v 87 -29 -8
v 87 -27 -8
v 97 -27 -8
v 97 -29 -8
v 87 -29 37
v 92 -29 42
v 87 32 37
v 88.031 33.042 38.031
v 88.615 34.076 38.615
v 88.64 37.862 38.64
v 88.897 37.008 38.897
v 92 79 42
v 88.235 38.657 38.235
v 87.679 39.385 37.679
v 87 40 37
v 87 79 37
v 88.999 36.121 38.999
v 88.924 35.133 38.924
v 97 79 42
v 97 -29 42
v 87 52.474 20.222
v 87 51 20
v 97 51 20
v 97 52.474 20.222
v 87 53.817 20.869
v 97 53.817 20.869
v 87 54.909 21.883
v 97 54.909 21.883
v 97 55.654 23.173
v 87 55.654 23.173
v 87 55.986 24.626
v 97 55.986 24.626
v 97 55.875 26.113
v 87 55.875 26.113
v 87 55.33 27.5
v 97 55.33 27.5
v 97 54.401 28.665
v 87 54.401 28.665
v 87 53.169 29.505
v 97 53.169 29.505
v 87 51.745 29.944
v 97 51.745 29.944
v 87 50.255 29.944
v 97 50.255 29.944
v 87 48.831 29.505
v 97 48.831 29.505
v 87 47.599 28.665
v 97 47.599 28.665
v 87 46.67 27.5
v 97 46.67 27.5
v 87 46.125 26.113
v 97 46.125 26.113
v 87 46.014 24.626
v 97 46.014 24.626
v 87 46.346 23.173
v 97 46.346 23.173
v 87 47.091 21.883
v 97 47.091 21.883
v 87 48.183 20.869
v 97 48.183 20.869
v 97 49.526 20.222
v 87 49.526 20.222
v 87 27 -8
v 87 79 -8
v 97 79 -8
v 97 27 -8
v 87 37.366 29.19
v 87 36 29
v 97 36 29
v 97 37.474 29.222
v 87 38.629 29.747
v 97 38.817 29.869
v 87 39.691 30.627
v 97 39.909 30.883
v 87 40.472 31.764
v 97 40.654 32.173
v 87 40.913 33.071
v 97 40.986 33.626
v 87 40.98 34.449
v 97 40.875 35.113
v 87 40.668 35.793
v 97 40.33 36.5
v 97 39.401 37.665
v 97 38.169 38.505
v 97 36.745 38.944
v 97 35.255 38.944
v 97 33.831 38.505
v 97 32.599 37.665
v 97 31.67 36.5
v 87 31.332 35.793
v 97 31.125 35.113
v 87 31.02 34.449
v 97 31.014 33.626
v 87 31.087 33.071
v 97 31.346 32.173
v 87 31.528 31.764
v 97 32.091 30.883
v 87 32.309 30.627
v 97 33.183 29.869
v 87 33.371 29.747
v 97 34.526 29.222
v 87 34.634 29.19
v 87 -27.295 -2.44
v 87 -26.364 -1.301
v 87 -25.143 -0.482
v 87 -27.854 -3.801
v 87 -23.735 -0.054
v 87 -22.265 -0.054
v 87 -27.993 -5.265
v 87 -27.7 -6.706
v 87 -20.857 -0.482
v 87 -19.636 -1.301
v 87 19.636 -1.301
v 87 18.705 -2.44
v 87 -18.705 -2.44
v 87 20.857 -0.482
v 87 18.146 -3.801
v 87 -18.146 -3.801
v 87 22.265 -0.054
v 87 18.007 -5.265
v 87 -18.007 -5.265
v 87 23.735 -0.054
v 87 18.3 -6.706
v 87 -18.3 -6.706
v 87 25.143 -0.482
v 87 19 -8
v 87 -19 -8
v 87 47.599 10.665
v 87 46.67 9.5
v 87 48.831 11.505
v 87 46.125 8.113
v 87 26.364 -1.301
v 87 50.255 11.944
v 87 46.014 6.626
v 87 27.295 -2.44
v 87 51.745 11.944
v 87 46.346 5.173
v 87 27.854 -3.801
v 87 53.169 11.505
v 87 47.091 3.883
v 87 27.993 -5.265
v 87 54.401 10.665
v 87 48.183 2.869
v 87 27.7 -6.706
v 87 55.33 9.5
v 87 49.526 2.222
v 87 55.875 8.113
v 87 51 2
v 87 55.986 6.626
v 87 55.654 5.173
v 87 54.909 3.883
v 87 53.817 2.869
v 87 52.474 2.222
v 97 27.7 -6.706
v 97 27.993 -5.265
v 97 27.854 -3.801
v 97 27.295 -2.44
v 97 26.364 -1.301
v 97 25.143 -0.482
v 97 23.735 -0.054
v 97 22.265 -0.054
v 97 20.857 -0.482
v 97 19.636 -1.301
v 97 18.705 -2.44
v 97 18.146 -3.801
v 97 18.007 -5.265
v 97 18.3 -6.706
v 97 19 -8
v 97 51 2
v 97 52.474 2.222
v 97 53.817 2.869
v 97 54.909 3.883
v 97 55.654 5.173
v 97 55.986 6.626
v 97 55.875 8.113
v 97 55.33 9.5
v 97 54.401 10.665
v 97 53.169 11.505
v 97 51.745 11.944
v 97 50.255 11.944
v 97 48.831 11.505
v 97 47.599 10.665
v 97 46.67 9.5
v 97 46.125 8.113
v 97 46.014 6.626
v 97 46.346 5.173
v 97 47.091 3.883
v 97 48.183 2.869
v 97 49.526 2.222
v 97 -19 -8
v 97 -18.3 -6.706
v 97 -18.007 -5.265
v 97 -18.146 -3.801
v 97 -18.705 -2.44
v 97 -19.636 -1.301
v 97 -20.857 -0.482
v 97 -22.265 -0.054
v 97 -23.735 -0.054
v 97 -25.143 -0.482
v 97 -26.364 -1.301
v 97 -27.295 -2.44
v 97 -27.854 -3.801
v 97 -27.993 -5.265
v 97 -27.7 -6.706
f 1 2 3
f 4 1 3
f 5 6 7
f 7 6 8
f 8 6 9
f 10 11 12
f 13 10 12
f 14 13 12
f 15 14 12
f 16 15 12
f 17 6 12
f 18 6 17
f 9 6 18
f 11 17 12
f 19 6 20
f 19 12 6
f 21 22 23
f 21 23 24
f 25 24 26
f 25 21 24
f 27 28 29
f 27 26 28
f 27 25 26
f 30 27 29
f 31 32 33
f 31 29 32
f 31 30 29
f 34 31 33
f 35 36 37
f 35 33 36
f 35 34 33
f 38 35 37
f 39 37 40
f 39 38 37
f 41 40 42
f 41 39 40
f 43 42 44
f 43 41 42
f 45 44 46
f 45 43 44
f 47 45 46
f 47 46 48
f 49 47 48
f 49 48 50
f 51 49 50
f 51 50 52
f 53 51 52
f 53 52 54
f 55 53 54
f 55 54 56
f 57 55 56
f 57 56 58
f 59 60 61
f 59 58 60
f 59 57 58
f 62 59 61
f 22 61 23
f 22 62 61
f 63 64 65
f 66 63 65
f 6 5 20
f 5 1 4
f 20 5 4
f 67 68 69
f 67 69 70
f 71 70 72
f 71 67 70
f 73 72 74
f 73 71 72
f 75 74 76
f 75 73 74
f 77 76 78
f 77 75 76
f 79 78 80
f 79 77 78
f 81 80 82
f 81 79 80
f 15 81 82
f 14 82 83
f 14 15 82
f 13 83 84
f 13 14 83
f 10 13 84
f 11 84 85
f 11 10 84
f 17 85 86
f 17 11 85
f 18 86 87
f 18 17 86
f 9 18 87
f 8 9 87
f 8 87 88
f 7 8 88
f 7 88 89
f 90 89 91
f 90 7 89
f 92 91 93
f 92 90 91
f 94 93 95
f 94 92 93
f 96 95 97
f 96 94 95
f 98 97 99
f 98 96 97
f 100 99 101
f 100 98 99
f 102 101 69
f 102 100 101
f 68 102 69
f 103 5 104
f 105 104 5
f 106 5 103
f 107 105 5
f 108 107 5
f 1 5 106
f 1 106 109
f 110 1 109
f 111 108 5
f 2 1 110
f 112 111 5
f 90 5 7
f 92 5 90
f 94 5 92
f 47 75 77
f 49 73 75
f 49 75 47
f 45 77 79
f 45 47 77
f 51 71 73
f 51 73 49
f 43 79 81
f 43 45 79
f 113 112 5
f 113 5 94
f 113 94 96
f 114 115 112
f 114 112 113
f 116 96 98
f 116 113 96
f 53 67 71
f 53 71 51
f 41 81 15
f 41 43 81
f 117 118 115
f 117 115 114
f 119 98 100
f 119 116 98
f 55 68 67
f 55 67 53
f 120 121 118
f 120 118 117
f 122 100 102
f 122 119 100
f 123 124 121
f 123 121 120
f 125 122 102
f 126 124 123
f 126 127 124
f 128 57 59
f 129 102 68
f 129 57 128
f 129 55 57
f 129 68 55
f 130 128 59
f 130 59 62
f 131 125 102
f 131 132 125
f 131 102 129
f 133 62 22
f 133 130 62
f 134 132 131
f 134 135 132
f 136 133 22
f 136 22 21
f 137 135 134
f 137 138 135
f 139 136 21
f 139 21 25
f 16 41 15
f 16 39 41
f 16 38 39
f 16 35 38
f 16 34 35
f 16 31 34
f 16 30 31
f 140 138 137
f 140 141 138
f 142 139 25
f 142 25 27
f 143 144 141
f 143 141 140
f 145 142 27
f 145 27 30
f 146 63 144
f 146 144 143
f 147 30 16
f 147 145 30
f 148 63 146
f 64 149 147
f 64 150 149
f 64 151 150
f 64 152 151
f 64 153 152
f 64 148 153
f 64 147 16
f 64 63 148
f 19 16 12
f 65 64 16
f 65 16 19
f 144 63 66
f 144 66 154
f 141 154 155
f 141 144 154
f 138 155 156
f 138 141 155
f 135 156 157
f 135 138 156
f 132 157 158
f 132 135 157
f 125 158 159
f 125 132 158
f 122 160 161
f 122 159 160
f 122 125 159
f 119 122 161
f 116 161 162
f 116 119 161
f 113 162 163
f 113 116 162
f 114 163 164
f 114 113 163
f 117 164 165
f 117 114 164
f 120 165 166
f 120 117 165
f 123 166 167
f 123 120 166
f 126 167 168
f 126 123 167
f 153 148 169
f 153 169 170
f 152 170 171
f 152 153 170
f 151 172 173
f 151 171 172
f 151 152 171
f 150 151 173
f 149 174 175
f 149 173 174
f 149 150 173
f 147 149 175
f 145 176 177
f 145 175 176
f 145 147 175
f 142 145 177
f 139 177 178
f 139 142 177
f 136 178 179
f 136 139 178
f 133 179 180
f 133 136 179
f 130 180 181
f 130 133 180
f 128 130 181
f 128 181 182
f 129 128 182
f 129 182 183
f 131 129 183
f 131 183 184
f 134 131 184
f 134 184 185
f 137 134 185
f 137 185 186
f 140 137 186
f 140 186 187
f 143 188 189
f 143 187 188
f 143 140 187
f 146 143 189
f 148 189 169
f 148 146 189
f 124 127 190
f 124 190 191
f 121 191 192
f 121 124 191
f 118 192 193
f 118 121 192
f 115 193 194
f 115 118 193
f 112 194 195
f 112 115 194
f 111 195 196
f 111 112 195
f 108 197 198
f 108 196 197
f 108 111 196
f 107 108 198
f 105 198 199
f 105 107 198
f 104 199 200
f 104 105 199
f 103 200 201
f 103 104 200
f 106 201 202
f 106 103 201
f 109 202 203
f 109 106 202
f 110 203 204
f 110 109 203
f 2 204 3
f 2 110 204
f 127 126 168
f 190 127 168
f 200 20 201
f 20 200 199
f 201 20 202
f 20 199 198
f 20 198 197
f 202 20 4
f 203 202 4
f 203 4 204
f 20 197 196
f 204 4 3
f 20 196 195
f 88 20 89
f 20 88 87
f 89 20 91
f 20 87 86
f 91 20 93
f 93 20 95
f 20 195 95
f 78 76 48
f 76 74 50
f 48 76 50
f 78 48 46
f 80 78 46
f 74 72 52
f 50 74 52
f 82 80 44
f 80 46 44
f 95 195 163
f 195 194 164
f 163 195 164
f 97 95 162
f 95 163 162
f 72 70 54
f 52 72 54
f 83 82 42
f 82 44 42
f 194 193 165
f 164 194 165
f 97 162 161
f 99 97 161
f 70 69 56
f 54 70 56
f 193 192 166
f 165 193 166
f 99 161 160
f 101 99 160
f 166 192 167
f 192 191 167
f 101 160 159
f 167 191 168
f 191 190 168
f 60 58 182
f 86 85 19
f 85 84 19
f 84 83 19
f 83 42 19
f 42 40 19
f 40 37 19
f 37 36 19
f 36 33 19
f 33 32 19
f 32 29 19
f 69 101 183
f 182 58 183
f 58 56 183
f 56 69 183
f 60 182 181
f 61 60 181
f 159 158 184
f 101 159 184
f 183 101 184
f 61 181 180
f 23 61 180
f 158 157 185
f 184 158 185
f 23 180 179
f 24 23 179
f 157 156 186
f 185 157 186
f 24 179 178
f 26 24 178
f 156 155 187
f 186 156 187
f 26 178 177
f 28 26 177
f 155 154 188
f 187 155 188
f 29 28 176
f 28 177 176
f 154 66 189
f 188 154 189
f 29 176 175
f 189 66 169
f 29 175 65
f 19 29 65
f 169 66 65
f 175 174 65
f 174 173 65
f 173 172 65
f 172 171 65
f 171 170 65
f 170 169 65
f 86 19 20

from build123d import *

# Parameters (mm, degrees)
CYLINDER408_R     = 5
CYLINDER408_DEPTH = 100
CYLINDER409_R     = 5
CYLINDER409_DEPTH = 100
CYLINDER410_R     = 5
CYLINDER410_DEPTH = 100
CYLINDER411_R     = 5
CYLINDER411_DEPTH = 100
CYLINDER412_R     = 5
CYLINDER412_DEPTH = 100
CYLINDER413_R     = 5
CYLINDER413_DEPTH = 100
CYLINDER414_R     = 5
CYLINDER414_DEPTH = 100
CYLINDER407_R     = 5
CYLINDER407_DEPTH = 100
BOX134_W          = 10
BOX134_H          = 108
BOX134_DEPTH      = 50
CHAMFER_SIZE      = 5


with BuildPart() as v_lec408:
    # Cylinder408 → Cylinder408 (new body)
    with BuildSketch(Plane(origin=(24, -51, 25), x_dir=(0, 0, -1), z_dir=(1, 0, 0))):
        Circle(CYLINDER408_R)
    extrude(amount=CYLINDER408_DEPTH)


with BuildPart() as v_lec409:
    # Cylinder409 → Cylinder409 (new body)
    with BuildSketch(Plane(origin=(24, 36, 34), x_dir=(0, 0, -1), z_dir=(1, 0, 0))):
        Circle(CYLINDER409_R)
    extrude(amount=CYLINDER409_DEPTH)


with BuildPart() as v_lec410:
    # Cylinder410 → Cylinder410 (new body)
    with BuildSketch(Plane(origin=(24, -36, 34), x_dir=(0, 0, -1), z_dir=(1, 0, 0))):
        Circle(CYLINDER410_R)
    extrude(amount=CYLINDER410_DEPTH)


with BuildPart() as v_lec411:
    # Cylinder411 → Cylinder411 (new body)
    with BuildSketch(Plane(origin=(24, -23, -5), x_dir=(0, 0, -1), z_dir=(1, 0, 0))):
        Circle(CYLINDER411_R)
    extrude(amount=CYLINDER411_DEPTH)


with BuildPart() as v_lec412:
    # Cylinder412 → Cylinder412 (new body)
    with BuildSketch(Plane(origin=(24, 51, 7), x_dir=(0, 0, -1), z_dir=(1, 0, 0))):
        Circle(CYLINDER412_R)
    extrude(amount=CYLINDER412_DEPTH)


with BuildPart() as v_lec413:
    # Cylinder413 → Cylinder413 (new body)
    with BuildSketch(Plane(origin=(24, 23, -5), x_dir=(0, 0, -1), z_dir=(1, 0, 0))):
        Circle(CYLINDER413_R)
    extrude(amount=CYLINDER413_DEPTH)


with BuildPart() as v_lec414:
    # Cylinder414 → Cylinder414 (new body)
    with BuildSketch(Plane(origin=(24, -51, 7), x_dir=(0, 0, -1), z_dir=(1, 0, 0))):
        Circle(CYLINDER414_R)
    extrude(amount=CYLINDER414_DEPTH)


with BuildPart() as compound586:
    # Cylinder407 → Cylinder407 (new body)
    with BuildSketch(Plane(origin=(24, 51, 25), x_dir=(0, 0, -1), z_dir=(1, 0, 0))):
        Circle(CYLINDER407_R)
    extrude(amount=CYLINDER407_DEPTH)

    # Compound586: union Válec408, Válec409, Válec410, Válec411, Válec412, Válec413, Válec414
    add(v_lec408.part)
    add(v_lec409.part)
    add(v_lec410.part)
    add(v_lec411.part)
    add(v_lec412.part)
    add(v_lec413.part)
    add(v_lec414.part)


with BuildPart() as compound586_1:
    # Compound586 placement: moved
    add(compound586.part.moved(Location((32, 0, 0))))


with BuildPart() as cut362:
    # Box134 → Box134 (new body)
    with BuildSketch(Plane(origin=(87, -29, -8), x_dir=(1, 0, 0), z_dir=(0, 0, 1))):
        with Locations((5, 54)):
            Rectangle(BOX134_W, BOX134_H)
    extrude(amount=BOX134_DEPTH)

    # Chamfer
    chamfer_edges = [cut362.edges().sort_by_distance(p)[0] for p in [
        (87, 25, 42),
    ]]
    chamfer(chamfer_edges, length=CHAMFER_SIZE)

    # Cut362: cut Compound586
    add(compound586_1.part, mode=Mode.SUBTRACT)


solid = cut362.part
